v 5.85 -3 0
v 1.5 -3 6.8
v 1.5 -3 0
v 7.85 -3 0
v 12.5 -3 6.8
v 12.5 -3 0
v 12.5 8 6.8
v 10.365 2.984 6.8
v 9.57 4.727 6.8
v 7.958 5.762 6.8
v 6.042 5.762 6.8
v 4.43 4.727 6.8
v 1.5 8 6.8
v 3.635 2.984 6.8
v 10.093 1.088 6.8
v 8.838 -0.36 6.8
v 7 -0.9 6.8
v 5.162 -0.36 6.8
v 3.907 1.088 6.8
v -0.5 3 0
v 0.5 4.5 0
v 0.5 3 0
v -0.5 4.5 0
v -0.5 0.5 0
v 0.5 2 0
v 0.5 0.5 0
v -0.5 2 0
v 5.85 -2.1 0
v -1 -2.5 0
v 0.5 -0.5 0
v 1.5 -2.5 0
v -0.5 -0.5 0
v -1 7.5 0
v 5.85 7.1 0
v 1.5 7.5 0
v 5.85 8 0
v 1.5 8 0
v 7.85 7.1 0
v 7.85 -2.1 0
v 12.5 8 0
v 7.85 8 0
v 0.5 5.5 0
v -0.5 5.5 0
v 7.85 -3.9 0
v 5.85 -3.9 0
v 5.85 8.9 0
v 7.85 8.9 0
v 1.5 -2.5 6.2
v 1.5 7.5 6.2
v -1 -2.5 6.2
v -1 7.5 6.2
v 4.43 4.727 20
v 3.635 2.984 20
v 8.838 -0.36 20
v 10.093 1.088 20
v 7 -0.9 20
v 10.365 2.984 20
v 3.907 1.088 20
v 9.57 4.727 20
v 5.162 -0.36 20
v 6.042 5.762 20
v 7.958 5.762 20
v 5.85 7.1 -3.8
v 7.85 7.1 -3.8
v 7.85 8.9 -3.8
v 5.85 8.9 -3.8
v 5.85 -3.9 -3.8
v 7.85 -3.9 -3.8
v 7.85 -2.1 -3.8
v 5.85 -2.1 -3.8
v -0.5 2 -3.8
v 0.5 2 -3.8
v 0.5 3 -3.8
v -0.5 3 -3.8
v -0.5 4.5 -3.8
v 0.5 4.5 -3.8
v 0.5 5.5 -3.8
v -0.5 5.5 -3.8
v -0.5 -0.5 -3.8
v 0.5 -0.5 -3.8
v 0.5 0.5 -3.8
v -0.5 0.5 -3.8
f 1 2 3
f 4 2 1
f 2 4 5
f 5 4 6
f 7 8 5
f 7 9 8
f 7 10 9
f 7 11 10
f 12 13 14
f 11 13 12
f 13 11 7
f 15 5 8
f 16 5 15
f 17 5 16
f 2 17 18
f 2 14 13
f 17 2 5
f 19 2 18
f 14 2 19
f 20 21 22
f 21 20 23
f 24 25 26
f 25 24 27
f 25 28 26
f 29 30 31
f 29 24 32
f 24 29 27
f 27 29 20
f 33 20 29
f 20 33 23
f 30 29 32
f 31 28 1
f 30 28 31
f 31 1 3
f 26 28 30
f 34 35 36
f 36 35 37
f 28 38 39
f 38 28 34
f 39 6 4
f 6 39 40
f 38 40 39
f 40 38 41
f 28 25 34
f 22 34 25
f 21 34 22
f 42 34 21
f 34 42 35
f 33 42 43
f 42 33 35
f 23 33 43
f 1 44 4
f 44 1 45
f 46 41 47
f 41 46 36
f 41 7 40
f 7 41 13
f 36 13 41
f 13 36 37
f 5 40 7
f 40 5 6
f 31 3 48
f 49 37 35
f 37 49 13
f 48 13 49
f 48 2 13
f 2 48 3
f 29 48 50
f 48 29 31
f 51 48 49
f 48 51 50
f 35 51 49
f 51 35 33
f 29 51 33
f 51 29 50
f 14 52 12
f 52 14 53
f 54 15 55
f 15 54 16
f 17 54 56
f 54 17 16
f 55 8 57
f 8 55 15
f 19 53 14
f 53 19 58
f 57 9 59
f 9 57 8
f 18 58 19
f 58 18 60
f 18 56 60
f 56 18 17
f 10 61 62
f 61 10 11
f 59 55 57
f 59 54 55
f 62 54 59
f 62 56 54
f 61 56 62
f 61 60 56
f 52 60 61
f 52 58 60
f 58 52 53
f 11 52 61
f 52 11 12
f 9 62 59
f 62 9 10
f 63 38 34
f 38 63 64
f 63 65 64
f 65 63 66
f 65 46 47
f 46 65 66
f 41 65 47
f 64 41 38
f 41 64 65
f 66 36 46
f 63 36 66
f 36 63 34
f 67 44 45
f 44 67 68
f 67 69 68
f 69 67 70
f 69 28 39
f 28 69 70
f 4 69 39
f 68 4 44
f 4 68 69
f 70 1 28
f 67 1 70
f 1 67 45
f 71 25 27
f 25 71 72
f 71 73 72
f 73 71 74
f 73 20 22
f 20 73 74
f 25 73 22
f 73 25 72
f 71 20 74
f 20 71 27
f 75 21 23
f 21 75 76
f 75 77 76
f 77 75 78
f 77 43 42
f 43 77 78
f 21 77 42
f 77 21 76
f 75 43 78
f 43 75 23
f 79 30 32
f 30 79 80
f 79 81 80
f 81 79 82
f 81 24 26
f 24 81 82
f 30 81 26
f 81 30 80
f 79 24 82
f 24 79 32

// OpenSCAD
shaftL=20;


rotate([0,0,-90])translate([-5.5-2.5, 7-5.5,0]){
    cube([11,11,6.8]);
    translate([0.5,-2.5,0])color("gray")cube([10,2.5,6.2]);
    translate([5.5,5.5,0])color("gray")cylinder(r=6.8/2, h=shaftL);

    translate([-1.8/2,-2.3/2+5.5,-3.8])cube([1.8,2,3.8]);
    translate([-1.8/2+11,-2.3/2+5.5,-3.8])cube([1.8,2,3.8]);

    translate([-0.5+5.5,-0.5+5.5-7,-3.8])cube([1,1,3.8]);
    translate([-0.5+5.5-2.5,-0.5+5.5-7,-3.8])cube([1,1,3.8]);
    translate([-0.5+5.5+2.5,-0.5+5.5-7,-3.8])cube([1,1,3.8]);
}
